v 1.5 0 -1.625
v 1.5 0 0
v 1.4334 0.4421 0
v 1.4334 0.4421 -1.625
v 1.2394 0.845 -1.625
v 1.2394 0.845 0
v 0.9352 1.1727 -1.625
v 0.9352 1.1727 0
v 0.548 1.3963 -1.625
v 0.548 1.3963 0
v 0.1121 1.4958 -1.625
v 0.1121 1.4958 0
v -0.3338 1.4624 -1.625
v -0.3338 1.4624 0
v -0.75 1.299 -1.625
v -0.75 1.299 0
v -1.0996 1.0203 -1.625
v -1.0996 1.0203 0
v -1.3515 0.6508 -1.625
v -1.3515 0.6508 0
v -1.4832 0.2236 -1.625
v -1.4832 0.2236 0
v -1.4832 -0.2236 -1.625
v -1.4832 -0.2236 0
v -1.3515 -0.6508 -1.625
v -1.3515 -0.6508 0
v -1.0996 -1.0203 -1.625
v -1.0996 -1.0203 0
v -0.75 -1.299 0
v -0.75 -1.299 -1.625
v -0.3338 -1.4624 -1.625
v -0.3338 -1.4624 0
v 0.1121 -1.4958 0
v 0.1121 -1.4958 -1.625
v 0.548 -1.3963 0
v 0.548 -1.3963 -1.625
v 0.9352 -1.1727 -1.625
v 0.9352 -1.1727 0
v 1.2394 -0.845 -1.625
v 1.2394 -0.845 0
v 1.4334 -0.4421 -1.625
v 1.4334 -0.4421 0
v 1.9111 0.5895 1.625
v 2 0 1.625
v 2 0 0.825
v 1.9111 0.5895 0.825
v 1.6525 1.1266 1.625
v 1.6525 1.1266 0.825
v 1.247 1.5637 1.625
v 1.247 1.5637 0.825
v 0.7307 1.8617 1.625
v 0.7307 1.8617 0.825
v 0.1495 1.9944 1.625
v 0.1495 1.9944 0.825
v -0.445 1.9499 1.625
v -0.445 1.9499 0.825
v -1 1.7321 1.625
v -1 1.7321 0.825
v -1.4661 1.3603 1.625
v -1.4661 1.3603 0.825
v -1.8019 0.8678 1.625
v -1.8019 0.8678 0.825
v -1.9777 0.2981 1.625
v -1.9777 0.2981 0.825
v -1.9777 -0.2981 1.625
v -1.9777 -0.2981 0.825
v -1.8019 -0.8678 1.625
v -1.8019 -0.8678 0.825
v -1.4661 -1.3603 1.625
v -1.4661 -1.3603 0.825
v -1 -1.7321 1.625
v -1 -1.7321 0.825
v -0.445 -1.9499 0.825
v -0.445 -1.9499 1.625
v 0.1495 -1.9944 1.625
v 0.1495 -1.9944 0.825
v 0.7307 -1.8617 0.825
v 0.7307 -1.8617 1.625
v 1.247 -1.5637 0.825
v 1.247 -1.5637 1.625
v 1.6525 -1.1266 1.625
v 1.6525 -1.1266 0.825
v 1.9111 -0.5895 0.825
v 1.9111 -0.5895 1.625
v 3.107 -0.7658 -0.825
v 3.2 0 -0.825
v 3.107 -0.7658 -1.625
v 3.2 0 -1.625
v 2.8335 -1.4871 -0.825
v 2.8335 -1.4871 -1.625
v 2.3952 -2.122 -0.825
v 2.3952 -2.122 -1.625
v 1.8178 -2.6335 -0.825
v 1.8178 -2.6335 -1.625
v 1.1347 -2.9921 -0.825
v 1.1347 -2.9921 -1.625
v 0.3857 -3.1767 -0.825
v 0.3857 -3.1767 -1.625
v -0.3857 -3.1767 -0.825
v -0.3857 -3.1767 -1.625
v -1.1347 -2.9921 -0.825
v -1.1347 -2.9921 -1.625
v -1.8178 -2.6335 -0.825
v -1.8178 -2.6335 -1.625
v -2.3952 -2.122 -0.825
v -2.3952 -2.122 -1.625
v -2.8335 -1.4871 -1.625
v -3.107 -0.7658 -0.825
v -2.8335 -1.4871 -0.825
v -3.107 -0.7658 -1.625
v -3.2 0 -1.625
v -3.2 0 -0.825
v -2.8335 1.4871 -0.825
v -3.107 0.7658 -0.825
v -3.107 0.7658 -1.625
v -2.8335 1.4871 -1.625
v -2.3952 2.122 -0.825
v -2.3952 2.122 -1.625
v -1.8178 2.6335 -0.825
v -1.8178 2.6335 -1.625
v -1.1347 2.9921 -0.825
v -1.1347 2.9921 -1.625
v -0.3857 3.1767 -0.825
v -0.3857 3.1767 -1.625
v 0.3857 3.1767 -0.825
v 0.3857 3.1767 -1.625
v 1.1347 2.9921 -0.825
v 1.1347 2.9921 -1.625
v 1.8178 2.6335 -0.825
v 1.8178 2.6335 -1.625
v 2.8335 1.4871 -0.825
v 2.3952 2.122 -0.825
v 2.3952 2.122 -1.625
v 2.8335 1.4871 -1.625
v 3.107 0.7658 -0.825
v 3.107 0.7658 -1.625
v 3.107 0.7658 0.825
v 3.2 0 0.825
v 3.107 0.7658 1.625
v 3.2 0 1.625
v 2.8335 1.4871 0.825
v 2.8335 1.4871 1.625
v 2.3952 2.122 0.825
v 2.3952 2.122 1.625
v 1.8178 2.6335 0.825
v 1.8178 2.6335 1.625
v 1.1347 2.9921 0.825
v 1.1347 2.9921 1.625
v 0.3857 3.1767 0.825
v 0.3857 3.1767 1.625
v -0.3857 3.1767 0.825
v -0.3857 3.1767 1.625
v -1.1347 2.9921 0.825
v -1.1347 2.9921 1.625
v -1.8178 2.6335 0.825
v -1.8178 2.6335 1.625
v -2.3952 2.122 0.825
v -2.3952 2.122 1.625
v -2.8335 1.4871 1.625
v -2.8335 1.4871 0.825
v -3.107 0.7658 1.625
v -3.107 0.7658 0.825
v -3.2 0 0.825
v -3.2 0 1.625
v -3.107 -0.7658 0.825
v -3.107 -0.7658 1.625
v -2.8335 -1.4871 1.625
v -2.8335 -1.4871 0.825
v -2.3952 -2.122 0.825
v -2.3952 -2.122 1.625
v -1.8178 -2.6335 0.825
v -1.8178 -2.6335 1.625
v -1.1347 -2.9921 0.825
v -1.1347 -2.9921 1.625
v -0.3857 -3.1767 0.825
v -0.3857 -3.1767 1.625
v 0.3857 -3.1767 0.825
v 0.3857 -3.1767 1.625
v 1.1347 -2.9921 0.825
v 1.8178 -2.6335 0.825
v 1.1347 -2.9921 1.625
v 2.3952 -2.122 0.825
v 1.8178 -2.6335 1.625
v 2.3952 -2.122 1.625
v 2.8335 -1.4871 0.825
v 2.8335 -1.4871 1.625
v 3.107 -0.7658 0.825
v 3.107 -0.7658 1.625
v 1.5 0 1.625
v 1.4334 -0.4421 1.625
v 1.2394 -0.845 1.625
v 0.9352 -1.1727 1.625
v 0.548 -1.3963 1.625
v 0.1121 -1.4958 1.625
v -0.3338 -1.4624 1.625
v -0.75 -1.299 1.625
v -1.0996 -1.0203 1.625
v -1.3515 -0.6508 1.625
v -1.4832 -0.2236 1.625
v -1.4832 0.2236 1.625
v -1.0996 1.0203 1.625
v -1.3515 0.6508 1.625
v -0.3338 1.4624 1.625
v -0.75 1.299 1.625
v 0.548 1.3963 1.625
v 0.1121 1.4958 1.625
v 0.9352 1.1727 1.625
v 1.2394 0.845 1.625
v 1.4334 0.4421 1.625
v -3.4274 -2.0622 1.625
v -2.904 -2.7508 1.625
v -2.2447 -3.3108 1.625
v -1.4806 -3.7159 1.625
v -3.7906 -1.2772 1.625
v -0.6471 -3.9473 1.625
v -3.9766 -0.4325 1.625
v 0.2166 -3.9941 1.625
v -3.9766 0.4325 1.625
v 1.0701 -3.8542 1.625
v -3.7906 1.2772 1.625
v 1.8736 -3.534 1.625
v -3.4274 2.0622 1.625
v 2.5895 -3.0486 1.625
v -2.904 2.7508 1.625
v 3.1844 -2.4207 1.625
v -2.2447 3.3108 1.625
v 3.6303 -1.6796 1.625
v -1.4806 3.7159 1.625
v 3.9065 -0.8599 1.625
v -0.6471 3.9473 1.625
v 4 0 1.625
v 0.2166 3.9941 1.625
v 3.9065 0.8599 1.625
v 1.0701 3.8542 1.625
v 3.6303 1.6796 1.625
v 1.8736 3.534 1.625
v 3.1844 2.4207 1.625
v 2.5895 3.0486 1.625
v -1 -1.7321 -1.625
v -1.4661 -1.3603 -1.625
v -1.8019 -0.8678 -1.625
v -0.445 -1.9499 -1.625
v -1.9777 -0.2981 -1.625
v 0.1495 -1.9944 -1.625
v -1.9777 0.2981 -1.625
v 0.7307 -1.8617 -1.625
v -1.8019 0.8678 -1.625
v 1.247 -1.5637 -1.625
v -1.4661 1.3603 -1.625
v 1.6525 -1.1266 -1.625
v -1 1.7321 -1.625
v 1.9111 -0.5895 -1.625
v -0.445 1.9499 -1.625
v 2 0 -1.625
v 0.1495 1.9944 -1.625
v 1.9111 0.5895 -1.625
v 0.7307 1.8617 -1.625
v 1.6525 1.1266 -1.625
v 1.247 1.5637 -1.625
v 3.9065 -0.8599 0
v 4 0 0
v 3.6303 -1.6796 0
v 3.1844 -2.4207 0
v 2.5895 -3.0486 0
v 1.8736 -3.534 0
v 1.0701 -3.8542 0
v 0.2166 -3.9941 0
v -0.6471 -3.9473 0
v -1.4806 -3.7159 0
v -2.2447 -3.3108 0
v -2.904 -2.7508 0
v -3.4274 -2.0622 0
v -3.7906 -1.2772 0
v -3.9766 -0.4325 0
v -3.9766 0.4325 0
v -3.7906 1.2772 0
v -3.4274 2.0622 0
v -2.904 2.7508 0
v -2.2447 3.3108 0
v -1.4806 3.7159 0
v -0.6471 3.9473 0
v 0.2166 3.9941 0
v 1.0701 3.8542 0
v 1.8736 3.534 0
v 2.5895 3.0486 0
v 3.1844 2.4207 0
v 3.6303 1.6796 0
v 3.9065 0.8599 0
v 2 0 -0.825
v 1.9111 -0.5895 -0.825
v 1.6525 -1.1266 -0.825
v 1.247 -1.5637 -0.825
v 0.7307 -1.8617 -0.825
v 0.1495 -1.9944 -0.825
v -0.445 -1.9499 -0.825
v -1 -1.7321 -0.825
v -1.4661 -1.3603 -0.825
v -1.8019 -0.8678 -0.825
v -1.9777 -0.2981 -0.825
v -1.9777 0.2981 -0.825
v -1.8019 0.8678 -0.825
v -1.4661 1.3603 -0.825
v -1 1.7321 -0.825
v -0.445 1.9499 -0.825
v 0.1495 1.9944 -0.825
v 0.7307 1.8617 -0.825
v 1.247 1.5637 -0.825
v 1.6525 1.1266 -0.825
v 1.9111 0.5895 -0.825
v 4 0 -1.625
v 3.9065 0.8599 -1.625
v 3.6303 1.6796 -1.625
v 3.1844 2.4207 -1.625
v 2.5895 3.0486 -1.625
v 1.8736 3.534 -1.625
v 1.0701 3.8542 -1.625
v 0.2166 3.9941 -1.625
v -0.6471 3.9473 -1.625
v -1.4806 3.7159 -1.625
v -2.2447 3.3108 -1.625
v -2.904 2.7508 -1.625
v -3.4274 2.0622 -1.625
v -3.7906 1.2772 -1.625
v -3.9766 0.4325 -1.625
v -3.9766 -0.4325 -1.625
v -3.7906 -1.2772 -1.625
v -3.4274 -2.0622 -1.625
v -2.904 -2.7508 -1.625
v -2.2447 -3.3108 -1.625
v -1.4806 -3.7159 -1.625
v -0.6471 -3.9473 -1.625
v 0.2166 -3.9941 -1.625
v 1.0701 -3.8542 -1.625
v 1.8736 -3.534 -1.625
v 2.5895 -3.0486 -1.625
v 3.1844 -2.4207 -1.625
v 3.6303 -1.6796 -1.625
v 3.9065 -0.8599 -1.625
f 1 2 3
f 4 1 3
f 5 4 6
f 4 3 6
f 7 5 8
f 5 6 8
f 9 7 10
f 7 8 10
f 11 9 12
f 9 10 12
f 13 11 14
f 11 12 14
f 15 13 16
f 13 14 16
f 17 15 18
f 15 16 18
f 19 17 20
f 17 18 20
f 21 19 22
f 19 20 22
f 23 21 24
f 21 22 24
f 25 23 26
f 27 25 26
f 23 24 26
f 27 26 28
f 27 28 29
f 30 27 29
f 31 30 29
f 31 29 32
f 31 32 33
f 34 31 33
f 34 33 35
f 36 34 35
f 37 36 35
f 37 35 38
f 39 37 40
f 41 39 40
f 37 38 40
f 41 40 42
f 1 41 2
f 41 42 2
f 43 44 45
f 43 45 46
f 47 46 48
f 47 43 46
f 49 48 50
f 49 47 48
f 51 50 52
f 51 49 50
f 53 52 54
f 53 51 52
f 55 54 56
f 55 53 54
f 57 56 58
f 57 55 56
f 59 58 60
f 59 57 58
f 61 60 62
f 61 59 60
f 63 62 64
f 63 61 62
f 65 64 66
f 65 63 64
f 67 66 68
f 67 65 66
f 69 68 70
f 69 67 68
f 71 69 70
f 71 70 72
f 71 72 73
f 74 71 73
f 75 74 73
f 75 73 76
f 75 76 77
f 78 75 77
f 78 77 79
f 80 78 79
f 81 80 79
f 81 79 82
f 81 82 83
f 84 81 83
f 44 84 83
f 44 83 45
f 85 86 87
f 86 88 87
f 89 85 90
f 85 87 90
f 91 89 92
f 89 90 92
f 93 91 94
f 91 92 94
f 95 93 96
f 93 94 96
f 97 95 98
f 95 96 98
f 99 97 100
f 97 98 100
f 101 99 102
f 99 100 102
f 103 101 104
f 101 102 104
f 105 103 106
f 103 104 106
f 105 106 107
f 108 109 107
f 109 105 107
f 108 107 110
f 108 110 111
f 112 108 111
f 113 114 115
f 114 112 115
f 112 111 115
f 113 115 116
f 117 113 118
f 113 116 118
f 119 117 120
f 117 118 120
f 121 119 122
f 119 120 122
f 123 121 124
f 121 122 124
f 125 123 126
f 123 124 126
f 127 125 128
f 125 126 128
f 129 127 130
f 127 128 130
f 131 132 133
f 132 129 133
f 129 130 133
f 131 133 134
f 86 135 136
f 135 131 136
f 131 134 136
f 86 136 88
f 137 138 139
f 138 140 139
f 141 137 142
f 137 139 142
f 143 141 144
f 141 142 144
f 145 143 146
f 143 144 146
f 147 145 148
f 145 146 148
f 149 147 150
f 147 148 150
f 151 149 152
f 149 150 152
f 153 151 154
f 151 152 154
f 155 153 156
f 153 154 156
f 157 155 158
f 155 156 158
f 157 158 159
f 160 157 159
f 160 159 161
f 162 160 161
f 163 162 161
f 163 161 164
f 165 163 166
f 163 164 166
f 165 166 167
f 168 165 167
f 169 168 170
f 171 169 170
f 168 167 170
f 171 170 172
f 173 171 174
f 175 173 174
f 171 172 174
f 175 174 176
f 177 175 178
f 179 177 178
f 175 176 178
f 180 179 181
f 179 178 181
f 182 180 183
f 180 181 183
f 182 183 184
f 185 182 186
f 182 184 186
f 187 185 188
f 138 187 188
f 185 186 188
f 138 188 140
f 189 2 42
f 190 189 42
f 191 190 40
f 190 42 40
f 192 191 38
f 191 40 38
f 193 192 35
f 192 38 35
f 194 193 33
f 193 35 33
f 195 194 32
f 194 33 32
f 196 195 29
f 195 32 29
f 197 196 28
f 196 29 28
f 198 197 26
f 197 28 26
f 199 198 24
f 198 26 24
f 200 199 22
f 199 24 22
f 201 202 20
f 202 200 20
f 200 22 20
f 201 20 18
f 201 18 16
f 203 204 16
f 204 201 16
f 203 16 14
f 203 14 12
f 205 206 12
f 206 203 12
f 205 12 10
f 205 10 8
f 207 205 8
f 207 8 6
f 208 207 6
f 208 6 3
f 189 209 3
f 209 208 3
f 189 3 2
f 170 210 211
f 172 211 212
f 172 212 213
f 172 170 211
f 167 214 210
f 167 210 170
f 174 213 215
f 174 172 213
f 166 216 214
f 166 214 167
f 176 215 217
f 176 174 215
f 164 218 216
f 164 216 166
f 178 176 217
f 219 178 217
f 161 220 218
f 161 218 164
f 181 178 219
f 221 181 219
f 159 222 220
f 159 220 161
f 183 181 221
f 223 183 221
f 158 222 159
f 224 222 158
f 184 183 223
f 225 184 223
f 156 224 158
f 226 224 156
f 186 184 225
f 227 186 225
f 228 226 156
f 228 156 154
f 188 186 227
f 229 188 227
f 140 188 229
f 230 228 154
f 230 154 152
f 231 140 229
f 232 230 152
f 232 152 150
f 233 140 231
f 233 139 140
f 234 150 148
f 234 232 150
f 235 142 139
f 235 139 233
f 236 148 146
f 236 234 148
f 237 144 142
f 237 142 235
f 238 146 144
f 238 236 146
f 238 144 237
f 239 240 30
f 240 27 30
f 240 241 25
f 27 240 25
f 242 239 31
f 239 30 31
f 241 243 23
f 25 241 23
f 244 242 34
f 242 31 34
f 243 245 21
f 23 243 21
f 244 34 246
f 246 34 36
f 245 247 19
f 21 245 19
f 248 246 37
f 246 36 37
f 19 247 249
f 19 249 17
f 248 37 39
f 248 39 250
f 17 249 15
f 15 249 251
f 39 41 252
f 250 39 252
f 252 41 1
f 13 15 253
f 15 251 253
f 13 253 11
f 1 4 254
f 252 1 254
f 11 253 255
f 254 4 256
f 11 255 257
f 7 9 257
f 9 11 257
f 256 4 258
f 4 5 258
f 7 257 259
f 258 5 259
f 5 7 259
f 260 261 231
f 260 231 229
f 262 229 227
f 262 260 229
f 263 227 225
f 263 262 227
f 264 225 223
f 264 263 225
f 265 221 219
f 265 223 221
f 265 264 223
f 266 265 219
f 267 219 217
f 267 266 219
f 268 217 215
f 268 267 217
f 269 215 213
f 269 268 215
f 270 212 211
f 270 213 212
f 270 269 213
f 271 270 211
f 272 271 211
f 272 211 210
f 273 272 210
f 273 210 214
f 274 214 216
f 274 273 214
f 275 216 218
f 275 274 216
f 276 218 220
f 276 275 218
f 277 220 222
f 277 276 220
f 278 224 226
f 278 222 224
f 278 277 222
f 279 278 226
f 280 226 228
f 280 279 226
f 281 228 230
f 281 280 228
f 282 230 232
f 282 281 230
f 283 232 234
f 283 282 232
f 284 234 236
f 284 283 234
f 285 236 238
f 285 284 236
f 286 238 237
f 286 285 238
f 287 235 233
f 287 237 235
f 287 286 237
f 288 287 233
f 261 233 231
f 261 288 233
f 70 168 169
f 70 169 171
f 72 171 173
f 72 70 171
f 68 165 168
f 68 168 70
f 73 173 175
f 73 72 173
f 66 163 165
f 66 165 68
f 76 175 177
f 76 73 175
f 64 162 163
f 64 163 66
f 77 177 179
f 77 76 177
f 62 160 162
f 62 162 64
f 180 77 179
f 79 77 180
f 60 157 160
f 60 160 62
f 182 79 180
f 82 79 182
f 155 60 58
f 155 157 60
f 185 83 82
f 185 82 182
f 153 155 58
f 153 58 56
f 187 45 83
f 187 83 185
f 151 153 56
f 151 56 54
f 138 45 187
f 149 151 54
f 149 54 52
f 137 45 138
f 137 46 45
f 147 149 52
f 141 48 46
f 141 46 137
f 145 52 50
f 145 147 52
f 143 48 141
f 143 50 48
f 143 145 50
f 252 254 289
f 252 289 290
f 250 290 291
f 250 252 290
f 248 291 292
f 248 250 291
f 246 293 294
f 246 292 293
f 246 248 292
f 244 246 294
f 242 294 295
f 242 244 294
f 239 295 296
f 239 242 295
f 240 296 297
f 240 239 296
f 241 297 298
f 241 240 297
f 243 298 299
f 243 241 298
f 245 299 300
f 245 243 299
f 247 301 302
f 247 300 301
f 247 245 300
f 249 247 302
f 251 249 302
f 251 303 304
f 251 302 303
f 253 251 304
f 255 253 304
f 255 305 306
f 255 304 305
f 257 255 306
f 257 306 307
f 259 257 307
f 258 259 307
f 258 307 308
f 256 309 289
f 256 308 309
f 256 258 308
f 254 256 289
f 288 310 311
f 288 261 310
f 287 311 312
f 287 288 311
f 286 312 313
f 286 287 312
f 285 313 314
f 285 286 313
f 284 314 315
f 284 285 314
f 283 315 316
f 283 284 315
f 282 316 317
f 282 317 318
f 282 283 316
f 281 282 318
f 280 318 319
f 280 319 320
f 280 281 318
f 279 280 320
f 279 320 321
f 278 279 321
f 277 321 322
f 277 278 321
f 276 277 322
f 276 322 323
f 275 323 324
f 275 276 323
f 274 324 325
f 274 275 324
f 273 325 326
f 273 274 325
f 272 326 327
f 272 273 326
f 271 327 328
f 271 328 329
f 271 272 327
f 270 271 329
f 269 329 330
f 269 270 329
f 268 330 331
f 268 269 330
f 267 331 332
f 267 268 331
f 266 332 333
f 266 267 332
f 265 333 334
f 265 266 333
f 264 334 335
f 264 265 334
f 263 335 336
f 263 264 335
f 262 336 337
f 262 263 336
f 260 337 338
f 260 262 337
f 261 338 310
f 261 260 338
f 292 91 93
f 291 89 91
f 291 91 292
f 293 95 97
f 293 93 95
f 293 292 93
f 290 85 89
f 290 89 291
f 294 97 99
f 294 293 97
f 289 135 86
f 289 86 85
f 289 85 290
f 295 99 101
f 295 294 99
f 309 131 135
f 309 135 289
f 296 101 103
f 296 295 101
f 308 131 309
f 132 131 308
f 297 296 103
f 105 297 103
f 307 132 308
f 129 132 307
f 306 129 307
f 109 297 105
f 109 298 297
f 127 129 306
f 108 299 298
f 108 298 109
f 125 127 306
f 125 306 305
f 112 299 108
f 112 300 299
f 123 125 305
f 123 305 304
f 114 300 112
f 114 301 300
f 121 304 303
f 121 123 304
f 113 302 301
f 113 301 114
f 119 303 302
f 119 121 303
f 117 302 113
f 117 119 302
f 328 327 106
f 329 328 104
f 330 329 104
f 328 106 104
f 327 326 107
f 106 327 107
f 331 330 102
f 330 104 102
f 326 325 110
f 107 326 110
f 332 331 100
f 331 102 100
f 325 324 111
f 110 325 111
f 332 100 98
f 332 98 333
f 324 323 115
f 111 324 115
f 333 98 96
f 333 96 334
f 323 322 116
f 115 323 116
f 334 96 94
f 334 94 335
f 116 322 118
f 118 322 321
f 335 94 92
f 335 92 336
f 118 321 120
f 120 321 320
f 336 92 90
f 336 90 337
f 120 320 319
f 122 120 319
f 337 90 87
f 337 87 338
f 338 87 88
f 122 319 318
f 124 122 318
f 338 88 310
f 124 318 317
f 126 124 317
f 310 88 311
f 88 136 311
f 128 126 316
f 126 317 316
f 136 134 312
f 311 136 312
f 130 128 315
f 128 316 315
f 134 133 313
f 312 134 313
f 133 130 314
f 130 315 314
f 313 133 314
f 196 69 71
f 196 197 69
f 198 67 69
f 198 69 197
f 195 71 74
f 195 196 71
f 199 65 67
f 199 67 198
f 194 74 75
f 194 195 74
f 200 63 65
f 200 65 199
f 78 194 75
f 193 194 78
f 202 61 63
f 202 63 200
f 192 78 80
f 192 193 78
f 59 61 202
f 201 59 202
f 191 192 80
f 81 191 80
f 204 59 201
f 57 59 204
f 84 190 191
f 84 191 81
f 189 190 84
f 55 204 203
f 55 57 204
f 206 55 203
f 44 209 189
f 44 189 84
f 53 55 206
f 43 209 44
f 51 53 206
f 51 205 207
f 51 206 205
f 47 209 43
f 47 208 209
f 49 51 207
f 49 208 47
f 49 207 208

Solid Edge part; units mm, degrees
sketch "Sketch1" plane through (0, 0, 0) normal (0, 0, 1) x (1, 0, 0)
  circle A0 centre (0, 0) radius 4
  circle A1 centre (0, 0) radius 1.5
extrude "Protrusion1" add sketch "Sketch1" along normal mid plane 3.25
sketch "Sketch2" plane through (0, 0, 1.625) normal (0, 0, 1) x (1, 0, 0)
  circle A0 centre (0, 0) radius 3.2
  circle A1 centre (0, 0) radius 2
extrude "VaciadoExtruido_1" cut sketch "Sketch2" against normal blind 0.8
mirror "Mirror1" about plane through (0, 0, 0) normal (0, 0, 1) of "VaciadoExtruido_1"
